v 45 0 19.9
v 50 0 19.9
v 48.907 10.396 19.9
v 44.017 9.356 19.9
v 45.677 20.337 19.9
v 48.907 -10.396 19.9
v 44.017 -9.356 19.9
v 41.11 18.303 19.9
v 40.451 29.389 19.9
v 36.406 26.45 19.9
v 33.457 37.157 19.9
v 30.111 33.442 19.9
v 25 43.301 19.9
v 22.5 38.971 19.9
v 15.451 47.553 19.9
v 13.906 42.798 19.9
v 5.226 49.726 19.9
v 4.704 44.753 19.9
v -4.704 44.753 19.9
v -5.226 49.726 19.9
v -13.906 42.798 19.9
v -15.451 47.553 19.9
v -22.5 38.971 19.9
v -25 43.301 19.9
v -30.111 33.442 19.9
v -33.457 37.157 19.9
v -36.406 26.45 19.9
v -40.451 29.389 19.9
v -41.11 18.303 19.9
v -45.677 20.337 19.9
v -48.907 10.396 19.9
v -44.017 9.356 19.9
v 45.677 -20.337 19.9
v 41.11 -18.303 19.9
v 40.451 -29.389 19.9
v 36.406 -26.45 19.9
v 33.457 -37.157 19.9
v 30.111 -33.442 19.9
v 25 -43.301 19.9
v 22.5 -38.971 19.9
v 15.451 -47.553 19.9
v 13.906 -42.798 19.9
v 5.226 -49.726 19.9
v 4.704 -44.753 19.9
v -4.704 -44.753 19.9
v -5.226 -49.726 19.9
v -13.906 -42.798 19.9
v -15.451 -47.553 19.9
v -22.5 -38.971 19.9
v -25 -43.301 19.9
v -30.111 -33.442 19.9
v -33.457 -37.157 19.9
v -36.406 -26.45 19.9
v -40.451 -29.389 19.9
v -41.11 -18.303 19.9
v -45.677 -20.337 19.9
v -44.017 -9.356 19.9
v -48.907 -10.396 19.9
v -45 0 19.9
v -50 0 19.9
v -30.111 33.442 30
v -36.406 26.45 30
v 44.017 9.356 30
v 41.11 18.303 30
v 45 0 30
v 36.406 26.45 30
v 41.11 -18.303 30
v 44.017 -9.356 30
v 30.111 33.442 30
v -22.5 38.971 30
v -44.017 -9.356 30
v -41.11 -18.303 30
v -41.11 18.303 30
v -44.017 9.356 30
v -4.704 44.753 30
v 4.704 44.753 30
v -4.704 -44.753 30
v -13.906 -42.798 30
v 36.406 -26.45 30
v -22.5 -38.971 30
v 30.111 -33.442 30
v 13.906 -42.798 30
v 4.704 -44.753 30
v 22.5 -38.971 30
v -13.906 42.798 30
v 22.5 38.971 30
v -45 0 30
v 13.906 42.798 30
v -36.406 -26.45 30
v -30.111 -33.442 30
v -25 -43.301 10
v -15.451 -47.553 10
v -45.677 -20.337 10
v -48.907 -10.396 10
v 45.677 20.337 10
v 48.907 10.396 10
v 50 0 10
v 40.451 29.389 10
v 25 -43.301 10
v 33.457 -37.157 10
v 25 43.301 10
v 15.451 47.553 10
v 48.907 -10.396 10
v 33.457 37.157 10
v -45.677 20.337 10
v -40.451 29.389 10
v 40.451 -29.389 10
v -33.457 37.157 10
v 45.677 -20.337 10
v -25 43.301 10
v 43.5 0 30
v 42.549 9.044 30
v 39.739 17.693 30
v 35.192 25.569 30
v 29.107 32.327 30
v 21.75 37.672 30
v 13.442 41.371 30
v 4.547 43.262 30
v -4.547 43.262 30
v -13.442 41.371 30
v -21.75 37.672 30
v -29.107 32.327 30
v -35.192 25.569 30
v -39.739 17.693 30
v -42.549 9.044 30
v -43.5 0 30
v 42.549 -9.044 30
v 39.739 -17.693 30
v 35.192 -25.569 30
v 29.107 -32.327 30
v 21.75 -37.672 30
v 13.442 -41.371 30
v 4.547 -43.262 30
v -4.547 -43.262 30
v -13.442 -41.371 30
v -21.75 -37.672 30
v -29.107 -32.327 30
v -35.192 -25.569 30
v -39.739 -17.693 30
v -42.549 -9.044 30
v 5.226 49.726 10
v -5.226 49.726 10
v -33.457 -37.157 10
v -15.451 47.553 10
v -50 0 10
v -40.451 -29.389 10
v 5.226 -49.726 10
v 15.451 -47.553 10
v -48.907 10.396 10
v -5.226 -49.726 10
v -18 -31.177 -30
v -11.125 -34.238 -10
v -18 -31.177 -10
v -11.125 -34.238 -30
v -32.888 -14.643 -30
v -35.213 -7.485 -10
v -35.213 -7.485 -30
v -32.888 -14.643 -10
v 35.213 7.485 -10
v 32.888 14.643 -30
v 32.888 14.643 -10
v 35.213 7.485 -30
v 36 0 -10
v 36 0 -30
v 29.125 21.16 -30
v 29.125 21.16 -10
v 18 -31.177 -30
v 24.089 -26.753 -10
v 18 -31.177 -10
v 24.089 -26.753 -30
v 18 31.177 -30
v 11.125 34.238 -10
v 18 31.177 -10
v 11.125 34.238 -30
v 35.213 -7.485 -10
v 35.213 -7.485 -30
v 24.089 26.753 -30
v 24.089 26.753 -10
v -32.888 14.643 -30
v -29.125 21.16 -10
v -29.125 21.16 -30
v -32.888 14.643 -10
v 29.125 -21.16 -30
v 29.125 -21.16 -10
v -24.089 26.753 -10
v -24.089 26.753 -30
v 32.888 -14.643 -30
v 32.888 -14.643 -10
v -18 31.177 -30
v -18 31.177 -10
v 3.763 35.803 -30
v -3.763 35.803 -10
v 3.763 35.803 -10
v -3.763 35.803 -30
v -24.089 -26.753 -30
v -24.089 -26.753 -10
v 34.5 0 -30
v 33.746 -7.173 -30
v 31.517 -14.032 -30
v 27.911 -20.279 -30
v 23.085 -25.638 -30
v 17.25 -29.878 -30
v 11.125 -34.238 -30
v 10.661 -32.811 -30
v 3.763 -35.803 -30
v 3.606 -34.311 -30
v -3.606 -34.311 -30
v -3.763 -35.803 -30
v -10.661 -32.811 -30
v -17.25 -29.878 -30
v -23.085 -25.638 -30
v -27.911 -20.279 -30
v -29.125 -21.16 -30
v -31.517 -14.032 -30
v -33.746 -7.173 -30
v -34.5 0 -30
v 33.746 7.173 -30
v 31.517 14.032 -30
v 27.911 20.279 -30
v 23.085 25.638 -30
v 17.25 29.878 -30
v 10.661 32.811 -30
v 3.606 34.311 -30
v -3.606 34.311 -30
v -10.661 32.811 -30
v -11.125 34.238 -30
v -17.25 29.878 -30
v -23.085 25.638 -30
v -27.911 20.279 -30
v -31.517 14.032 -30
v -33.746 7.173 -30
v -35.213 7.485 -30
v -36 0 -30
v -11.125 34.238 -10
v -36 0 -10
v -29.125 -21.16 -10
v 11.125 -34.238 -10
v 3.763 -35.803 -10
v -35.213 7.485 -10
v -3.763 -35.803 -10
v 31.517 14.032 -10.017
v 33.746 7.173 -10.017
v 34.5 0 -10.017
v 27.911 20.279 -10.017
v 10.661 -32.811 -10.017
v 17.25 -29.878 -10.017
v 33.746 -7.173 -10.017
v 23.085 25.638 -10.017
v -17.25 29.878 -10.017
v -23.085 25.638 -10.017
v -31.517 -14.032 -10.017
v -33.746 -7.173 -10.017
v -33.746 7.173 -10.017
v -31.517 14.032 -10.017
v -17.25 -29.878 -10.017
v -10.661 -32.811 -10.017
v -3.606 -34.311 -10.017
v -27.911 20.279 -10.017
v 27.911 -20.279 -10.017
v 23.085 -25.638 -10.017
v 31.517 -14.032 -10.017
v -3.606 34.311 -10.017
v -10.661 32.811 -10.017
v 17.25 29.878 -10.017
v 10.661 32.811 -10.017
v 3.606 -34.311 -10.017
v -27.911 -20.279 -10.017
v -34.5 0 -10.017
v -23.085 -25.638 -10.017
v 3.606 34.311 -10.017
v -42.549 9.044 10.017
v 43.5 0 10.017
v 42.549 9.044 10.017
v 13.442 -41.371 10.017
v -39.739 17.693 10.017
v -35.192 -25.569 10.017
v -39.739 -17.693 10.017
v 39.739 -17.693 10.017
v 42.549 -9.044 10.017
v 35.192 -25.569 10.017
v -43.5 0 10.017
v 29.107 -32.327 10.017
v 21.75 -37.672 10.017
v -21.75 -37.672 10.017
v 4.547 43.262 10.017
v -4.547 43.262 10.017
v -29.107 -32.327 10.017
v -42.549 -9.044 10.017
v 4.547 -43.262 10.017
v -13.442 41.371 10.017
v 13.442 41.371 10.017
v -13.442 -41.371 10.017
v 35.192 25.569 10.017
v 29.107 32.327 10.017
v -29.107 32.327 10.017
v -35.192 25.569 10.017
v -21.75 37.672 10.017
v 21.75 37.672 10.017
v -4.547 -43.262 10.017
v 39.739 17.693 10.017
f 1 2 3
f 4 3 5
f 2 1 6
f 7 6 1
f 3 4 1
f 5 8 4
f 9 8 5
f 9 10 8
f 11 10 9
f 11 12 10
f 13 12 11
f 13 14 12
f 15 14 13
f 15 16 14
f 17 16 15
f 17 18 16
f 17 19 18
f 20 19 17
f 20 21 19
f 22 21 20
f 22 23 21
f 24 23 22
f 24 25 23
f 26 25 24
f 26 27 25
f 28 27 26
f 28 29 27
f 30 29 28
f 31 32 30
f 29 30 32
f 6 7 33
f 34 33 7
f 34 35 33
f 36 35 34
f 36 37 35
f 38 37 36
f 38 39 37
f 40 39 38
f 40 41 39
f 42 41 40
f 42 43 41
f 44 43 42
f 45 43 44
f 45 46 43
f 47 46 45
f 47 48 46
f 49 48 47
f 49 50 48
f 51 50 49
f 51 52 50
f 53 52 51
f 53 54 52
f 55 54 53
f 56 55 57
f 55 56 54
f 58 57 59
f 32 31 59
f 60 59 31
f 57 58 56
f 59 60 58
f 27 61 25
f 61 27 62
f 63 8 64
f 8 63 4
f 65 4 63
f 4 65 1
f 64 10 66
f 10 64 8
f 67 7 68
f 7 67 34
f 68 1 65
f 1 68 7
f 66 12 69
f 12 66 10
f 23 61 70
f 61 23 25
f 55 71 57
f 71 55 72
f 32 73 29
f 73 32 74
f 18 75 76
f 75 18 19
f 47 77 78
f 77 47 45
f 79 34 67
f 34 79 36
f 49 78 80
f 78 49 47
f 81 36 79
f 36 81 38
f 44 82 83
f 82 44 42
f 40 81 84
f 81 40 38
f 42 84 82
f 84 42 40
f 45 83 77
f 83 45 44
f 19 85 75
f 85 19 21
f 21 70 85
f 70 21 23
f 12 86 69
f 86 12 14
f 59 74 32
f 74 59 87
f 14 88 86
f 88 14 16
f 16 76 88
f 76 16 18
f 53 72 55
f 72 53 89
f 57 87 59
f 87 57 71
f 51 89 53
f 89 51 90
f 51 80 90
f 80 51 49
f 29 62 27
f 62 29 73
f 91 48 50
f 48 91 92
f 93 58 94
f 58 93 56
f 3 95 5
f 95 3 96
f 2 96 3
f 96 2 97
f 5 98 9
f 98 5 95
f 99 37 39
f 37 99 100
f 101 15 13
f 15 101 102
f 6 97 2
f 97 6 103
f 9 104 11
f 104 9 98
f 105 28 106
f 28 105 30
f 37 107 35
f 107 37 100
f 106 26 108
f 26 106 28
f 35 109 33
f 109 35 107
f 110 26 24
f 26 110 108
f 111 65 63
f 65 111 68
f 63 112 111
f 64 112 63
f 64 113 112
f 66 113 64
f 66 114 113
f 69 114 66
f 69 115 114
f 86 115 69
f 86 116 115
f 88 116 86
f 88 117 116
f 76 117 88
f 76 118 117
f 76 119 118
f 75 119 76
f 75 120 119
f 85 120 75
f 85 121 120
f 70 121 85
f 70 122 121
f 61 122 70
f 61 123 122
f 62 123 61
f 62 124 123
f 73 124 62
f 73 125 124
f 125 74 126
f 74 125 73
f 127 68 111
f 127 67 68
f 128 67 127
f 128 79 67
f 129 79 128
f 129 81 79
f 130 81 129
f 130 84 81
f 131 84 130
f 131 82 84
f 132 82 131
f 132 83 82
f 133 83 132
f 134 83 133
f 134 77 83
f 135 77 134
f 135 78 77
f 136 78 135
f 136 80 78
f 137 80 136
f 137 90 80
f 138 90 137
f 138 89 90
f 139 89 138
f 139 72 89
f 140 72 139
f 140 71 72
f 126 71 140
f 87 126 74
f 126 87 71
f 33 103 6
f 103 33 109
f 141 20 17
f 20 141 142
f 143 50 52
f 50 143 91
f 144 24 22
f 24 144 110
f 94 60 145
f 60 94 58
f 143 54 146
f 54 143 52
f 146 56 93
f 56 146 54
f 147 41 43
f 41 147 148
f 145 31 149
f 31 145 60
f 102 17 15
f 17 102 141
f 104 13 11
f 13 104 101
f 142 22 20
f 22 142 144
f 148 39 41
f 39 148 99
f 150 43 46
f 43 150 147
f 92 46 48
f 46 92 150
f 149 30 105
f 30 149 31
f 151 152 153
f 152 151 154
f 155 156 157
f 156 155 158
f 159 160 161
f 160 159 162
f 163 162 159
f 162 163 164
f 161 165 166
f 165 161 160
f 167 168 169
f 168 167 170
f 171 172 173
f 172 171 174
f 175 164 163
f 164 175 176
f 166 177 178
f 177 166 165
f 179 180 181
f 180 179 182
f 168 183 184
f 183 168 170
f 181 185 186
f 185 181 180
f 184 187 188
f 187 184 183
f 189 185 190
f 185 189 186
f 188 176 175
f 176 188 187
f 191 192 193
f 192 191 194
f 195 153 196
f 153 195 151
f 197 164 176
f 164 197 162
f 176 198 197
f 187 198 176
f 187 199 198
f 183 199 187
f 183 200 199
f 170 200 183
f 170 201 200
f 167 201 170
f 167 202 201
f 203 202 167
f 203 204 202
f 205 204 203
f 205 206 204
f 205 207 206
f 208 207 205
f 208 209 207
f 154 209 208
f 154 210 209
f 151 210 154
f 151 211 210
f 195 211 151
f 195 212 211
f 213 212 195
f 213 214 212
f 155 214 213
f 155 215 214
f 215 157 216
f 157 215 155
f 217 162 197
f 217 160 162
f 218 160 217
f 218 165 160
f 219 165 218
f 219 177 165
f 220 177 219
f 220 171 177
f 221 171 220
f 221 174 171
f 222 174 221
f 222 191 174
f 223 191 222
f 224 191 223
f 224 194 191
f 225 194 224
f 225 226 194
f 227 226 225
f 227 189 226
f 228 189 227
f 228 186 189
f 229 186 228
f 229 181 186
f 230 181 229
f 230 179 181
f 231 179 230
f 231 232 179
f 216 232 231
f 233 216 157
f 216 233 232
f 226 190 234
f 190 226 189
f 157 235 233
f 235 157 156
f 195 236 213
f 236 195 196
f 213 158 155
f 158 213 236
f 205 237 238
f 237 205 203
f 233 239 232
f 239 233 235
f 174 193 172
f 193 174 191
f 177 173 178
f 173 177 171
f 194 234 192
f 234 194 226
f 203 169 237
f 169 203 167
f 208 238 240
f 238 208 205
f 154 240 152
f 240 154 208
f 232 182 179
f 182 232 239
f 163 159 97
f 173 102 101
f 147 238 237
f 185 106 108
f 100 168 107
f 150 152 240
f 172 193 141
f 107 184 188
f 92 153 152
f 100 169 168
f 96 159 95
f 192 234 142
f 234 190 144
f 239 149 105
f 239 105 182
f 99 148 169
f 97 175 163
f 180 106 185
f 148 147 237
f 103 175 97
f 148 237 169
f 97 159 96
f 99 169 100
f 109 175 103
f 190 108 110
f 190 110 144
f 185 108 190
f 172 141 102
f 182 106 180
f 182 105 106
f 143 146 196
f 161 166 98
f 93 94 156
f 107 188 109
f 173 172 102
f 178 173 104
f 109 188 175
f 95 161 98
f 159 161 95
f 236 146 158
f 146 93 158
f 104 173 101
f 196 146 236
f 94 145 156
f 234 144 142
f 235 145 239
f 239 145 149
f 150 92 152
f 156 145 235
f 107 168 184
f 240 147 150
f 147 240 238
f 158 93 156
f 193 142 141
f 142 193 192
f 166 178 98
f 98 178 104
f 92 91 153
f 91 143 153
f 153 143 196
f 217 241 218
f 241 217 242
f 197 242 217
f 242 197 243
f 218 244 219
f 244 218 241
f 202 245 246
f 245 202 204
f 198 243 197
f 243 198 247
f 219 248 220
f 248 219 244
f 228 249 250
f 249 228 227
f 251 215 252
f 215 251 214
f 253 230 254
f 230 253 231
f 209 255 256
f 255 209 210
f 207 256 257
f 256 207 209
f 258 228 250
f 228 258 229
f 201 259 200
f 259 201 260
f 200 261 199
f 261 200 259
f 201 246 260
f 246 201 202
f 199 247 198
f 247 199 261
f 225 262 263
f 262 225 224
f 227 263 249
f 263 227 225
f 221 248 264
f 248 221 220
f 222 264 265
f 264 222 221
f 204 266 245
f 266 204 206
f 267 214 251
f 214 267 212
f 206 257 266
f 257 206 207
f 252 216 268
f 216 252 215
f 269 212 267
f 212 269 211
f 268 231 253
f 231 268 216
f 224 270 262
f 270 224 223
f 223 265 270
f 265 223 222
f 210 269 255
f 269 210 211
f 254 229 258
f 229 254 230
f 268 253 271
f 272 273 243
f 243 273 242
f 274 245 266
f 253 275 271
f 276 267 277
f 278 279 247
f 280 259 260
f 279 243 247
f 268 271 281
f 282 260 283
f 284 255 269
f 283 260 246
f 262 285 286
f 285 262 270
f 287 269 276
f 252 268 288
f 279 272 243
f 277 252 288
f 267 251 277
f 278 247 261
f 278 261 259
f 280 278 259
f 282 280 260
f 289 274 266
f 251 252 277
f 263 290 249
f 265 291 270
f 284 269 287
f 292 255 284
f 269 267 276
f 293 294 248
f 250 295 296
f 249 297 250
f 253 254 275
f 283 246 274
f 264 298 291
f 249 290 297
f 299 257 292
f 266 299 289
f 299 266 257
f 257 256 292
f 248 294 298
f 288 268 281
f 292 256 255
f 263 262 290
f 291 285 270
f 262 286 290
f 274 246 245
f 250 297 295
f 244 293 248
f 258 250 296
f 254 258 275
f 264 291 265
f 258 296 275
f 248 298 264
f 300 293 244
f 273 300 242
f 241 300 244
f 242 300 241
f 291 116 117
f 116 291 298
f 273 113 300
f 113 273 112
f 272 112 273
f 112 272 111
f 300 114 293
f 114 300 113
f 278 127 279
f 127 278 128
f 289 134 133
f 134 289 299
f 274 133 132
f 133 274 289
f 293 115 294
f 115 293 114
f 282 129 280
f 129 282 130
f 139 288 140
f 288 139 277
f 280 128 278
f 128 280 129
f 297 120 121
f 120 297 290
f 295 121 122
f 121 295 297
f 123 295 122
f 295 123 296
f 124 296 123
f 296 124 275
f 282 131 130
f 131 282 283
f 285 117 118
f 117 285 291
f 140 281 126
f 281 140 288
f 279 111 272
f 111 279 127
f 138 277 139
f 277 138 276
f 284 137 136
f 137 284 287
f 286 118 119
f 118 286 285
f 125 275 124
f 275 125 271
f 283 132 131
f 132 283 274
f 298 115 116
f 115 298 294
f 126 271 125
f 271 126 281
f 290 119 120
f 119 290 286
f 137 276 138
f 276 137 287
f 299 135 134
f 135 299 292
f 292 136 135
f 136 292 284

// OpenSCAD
schlauch_durchmesser                  = 75;
schlauch_wand_staerke                 = 1.5;

schlauch_anschluss_durchmesser        = 90;
schlauch_anschluss_durchmesser_aussen = 100;
wand_staerke                          = 1.5;

hoehe                                 = 60;

difference() {
    body(
        schlauch_durchmesser - schlauch_wand_staerke * 2,
        schlauch_anschluss_durchmesser,
        schlauch_anschluss_durchmesser_aussen,
        hoehe
    );
    body(
        schlauch_durchmesser - schlauch_wand_staerke * 2 - wand_staerke * 2,
        schlauch_anschluss_durchmesser - wand_staerke * 2,
        schlauch_anschluss_durchmesser - wand_staerke * 2,
        hoehe + 0.1
    );
}

module body(von_durchmesser = 10, auf_durchmesser_innen = 20, auf_durchmesser_aussen = 30, gesamt_hoehe = 30) {
    union() {
        translate([0, 0, gesamt_hoehe / -3]) {
            cylinder(d = von_durchmesser, h = gesamt_hoehe / 3, center = true);
        }
        cylinder(d1 = von_durchmesser, d2 = auf_durchmesser_aussen, h = gesamt_hoehe / 3, center = true);
        translate([0, 0, gesamt_hoehe / 3]) {
            difference() {
                cylinder(d = auf_durchmesser_aussen, h = gesamt_hoehe / 3, center = true);
                if (auf_durchmesser_innen < auf_durchmesser_aussen) {
                    translate([0, 0, gesamt_hoehe / 12]) {
                        difference() {
                            cylinder(d = auf_durchmesser_aussen + 0.2, h = gesamt_hoehe / 6 + 0.2, center = true);
                            cylinder(d = auf_durchmesser_innen, h = gesamt_hoehe / 6 + 0.2, center = true);
                        }
                    }
                }
            }
        }
    }
}
